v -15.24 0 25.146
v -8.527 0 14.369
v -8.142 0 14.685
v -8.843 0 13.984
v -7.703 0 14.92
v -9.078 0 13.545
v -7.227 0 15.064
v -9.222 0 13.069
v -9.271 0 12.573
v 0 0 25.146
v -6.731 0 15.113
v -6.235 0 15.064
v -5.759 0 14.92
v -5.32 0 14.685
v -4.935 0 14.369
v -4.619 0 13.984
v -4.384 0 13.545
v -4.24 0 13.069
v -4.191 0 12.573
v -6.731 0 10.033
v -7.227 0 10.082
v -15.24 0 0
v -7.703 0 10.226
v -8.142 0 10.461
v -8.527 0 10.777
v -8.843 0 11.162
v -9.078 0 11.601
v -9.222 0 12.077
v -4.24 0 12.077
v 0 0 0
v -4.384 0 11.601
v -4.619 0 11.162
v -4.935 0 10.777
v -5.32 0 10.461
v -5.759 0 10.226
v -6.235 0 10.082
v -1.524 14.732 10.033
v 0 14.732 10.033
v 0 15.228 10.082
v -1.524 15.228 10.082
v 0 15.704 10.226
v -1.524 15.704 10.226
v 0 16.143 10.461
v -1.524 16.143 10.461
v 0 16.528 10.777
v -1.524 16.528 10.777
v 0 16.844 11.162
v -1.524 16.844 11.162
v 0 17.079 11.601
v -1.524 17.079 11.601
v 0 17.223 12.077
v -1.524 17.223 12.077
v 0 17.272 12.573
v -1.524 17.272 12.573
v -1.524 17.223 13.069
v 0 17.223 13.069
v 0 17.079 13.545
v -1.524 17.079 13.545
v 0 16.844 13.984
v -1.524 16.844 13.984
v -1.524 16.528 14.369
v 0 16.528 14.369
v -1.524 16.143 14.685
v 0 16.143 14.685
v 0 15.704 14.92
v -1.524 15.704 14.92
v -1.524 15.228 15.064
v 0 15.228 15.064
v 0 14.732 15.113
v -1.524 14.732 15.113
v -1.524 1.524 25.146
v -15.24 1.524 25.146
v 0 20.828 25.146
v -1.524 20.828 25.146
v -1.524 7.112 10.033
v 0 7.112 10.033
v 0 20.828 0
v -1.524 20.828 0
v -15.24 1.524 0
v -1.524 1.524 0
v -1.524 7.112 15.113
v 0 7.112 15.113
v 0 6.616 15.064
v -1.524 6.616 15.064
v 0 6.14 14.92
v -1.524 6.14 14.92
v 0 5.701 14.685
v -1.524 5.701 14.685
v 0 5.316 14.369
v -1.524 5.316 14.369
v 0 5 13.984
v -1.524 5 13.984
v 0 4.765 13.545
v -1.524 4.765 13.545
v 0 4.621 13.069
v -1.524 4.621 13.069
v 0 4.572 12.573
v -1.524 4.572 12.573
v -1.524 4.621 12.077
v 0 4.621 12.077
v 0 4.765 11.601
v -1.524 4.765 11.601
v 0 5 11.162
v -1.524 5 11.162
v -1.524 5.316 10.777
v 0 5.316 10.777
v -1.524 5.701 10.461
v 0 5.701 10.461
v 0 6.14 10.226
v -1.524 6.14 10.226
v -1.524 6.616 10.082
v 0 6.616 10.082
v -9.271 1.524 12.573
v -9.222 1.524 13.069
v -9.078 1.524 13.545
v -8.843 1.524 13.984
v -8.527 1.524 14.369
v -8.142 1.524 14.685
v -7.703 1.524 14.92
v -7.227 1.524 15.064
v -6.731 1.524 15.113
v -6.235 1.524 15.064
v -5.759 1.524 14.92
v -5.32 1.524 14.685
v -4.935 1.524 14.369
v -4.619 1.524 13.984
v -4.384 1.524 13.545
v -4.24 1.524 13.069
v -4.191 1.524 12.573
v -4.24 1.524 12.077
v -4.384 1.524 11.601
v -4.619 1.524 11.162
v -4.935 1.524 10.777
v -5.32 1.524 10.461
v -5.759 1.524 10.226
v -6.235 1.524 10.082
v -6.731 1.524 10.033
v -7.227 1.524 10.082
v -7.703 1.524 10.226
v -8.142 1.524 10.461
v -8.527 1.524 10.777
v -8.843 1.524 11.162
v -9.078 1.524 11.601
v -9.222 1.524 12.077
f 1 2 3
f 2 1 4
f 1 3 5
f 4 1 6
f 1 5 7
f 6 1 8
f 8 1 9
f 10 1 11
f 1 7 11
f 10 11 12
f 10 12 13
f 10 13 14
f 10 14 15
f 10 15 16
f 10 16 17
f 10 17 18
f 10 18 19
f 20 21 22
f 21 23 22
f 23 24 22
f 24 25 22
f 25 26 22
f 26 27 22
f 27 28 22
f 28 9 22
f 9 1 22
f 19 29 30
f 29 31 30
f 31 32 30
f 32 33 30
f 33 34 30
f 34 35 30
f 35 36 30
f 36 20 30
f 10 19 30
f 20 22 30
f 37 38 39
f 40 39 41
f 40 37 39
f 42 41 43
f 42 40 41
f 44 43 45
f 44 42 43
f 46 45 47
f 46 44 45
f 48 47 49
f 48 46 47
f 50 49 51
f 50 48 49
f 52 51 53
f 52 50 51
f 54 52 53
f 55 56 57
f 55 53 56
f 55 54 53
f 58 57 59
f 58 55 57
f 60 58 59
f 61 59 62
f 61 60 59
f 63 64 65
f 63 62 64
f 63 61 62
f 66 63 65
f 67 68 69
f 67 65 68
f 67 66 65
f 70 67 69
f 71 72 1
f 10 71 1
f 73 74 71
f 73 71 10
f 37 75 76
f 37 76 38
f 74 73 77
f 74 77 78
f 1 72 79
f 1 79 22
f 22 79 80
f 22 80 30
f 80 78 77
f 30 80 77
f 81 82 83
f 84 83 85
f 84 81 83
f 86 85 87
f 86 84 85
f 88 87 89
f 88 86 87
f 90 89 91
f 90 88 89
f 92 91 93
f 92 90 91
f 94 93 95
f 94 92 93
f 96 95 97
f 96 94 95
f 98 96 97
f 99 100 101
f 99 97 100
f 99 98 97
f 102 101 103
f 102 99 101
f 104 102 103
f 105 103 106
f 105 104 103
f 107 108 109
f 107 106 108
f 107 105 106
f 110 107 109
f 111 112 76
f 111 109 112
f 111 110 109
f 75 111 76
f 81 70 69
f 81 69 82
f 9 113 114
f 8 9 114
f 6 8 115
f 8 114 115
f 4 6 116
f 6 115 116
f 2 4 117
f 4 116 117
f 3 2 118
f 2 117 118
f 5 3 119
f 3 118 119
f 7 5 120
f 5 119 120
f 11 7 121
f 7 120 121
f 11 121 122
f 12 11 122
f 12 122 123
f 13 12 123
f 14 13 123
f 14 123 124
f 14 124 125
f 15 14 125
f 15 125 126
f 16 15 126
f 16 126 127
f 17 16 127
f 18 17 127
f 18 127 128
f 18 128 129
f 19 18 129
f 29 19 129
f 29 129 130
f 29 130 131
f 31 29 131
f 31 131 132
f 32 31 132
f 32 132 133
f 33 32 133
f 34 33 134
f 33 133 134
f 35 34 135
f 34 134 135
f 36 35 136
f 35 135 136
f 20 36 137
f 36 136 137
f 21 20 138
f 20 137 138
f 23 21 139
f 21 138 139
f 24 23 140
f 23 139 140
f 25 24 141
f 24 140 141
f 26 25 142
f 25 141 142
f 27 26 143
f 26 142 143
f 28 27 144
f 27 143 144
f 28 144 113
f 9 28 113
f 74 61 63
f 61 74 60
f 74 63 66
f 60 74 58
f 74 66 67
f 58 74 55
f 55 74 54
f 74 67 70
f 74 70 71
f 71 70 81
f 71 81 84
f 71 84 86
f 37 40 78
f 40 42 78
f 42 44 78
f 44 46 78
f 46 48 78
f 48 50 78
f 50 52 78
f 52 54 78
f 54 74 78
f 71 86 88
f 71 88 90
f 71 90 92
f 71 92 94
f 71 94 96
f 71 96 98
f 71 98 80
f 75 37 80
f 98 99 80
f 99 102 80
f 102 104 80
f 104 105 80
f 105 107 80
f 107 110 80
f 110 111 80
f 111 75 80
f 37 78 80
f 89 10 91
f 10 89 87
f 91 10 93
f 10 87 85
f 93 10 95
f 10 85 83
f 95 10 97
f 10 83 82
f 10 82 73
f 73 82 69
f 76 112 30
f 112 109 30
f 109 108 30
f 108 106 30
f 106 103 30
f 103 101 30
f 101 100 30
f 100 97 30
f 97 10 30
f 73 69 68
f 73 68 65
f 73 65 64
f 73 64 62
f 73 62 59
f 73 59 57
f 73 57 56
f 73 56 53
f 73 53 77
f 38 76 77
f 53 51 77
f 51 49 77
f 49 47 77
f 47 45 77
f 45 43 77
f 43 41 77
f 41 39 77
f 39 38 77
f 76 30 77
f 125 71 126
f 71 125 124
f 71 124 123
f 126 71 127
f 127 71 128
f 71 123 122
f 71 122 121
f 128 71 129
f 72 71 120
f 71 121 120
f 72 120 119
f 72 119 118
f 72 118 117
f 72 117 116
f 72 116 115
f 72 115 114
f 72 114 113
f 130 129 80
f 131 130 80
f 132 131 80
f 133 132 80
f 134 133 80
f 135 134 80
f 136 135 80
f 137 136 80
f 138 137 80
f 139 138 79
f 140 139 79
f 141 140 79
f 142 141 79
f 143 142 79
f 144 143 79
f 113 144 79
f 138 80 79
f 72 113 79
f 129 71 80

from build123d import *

# Parameters (mm, degrees)
BOSS_EXTRUDE2_DEPTH = 25.146
CUT_EXTRUDE1_REACH  = 37.415
CUT_EXTRUDE2_REACH  = 37.174
SKETCH4_R           = 2.54


with BuildPart() as part:
    # Sketch1 → Boss-Extrude2 (new body)
    with BuildSketch(Plane.XY):
        Polygon((-15.24, 0), (0, 0), (0, 20.828), (-1.524, 20.828), (-1.524, 1.524), (-15.24, 1.524), align=None)
    extrude(amount=BOSS_EXTRUDE2_DEPTH)

    # Sketch3 → Cut-Extrude1 (cut, up to next)
    with BuildSketch(Plane.ZY.offset(1.524), mode=Mode.PRIVATE) as cut_extrude1_sk1:
        with BuildLine():
            Line((15.113, 14.732), (15.113, 7.112))
            ThreePointArc((15.113, 7.112), (12.573, 4.572), (10.033, 7.112))
            Line((10.033, 7.112), (10.033, 14.732))
            ThreePointArc((10.033, 14.732), (12.573, 17.272), (15.113, 14.732))
        make_face()
    cut_extrude1_tool1 = extrude(cut_extrude1_sk1.sketch, amount=-CUT_EXTRUDE1_REACH, mode=Mode.PRIVATE) & part.part
    add(cut_extrude1_tool1.solids().sort_by_distance((-1.524, 10.922, 12.573))[0], mode=Mode.SUBTRACT)

    # Sketch4 → Cut-Extrude2 (cut, up to next)
    with BuildSketch(Plane(origin=(0, 1.524, 0), x_dir=(1, 0, 0), z_dir=(0, 1, 0)), mode=Mode.PRIVATE) as cut_extrude2_sk1:
        with Locations(Location((-6.731, -12.573, 0), (0, 0, 180))):
            Circle(SKETCH4_R)
    cut_extrude2_tool1 = extrude(cut_extrude2_sk1.sketch, amount=-CUT_EXTRUDE2_REACH, mode=Mode.PRIVATE) & part.part
    add(cut_extrude2_tool1.solids().sort_by_distance((-6.731, 1.524, 12.573))[0], mode=Mode.SUBTRACT)


solid = part.part
